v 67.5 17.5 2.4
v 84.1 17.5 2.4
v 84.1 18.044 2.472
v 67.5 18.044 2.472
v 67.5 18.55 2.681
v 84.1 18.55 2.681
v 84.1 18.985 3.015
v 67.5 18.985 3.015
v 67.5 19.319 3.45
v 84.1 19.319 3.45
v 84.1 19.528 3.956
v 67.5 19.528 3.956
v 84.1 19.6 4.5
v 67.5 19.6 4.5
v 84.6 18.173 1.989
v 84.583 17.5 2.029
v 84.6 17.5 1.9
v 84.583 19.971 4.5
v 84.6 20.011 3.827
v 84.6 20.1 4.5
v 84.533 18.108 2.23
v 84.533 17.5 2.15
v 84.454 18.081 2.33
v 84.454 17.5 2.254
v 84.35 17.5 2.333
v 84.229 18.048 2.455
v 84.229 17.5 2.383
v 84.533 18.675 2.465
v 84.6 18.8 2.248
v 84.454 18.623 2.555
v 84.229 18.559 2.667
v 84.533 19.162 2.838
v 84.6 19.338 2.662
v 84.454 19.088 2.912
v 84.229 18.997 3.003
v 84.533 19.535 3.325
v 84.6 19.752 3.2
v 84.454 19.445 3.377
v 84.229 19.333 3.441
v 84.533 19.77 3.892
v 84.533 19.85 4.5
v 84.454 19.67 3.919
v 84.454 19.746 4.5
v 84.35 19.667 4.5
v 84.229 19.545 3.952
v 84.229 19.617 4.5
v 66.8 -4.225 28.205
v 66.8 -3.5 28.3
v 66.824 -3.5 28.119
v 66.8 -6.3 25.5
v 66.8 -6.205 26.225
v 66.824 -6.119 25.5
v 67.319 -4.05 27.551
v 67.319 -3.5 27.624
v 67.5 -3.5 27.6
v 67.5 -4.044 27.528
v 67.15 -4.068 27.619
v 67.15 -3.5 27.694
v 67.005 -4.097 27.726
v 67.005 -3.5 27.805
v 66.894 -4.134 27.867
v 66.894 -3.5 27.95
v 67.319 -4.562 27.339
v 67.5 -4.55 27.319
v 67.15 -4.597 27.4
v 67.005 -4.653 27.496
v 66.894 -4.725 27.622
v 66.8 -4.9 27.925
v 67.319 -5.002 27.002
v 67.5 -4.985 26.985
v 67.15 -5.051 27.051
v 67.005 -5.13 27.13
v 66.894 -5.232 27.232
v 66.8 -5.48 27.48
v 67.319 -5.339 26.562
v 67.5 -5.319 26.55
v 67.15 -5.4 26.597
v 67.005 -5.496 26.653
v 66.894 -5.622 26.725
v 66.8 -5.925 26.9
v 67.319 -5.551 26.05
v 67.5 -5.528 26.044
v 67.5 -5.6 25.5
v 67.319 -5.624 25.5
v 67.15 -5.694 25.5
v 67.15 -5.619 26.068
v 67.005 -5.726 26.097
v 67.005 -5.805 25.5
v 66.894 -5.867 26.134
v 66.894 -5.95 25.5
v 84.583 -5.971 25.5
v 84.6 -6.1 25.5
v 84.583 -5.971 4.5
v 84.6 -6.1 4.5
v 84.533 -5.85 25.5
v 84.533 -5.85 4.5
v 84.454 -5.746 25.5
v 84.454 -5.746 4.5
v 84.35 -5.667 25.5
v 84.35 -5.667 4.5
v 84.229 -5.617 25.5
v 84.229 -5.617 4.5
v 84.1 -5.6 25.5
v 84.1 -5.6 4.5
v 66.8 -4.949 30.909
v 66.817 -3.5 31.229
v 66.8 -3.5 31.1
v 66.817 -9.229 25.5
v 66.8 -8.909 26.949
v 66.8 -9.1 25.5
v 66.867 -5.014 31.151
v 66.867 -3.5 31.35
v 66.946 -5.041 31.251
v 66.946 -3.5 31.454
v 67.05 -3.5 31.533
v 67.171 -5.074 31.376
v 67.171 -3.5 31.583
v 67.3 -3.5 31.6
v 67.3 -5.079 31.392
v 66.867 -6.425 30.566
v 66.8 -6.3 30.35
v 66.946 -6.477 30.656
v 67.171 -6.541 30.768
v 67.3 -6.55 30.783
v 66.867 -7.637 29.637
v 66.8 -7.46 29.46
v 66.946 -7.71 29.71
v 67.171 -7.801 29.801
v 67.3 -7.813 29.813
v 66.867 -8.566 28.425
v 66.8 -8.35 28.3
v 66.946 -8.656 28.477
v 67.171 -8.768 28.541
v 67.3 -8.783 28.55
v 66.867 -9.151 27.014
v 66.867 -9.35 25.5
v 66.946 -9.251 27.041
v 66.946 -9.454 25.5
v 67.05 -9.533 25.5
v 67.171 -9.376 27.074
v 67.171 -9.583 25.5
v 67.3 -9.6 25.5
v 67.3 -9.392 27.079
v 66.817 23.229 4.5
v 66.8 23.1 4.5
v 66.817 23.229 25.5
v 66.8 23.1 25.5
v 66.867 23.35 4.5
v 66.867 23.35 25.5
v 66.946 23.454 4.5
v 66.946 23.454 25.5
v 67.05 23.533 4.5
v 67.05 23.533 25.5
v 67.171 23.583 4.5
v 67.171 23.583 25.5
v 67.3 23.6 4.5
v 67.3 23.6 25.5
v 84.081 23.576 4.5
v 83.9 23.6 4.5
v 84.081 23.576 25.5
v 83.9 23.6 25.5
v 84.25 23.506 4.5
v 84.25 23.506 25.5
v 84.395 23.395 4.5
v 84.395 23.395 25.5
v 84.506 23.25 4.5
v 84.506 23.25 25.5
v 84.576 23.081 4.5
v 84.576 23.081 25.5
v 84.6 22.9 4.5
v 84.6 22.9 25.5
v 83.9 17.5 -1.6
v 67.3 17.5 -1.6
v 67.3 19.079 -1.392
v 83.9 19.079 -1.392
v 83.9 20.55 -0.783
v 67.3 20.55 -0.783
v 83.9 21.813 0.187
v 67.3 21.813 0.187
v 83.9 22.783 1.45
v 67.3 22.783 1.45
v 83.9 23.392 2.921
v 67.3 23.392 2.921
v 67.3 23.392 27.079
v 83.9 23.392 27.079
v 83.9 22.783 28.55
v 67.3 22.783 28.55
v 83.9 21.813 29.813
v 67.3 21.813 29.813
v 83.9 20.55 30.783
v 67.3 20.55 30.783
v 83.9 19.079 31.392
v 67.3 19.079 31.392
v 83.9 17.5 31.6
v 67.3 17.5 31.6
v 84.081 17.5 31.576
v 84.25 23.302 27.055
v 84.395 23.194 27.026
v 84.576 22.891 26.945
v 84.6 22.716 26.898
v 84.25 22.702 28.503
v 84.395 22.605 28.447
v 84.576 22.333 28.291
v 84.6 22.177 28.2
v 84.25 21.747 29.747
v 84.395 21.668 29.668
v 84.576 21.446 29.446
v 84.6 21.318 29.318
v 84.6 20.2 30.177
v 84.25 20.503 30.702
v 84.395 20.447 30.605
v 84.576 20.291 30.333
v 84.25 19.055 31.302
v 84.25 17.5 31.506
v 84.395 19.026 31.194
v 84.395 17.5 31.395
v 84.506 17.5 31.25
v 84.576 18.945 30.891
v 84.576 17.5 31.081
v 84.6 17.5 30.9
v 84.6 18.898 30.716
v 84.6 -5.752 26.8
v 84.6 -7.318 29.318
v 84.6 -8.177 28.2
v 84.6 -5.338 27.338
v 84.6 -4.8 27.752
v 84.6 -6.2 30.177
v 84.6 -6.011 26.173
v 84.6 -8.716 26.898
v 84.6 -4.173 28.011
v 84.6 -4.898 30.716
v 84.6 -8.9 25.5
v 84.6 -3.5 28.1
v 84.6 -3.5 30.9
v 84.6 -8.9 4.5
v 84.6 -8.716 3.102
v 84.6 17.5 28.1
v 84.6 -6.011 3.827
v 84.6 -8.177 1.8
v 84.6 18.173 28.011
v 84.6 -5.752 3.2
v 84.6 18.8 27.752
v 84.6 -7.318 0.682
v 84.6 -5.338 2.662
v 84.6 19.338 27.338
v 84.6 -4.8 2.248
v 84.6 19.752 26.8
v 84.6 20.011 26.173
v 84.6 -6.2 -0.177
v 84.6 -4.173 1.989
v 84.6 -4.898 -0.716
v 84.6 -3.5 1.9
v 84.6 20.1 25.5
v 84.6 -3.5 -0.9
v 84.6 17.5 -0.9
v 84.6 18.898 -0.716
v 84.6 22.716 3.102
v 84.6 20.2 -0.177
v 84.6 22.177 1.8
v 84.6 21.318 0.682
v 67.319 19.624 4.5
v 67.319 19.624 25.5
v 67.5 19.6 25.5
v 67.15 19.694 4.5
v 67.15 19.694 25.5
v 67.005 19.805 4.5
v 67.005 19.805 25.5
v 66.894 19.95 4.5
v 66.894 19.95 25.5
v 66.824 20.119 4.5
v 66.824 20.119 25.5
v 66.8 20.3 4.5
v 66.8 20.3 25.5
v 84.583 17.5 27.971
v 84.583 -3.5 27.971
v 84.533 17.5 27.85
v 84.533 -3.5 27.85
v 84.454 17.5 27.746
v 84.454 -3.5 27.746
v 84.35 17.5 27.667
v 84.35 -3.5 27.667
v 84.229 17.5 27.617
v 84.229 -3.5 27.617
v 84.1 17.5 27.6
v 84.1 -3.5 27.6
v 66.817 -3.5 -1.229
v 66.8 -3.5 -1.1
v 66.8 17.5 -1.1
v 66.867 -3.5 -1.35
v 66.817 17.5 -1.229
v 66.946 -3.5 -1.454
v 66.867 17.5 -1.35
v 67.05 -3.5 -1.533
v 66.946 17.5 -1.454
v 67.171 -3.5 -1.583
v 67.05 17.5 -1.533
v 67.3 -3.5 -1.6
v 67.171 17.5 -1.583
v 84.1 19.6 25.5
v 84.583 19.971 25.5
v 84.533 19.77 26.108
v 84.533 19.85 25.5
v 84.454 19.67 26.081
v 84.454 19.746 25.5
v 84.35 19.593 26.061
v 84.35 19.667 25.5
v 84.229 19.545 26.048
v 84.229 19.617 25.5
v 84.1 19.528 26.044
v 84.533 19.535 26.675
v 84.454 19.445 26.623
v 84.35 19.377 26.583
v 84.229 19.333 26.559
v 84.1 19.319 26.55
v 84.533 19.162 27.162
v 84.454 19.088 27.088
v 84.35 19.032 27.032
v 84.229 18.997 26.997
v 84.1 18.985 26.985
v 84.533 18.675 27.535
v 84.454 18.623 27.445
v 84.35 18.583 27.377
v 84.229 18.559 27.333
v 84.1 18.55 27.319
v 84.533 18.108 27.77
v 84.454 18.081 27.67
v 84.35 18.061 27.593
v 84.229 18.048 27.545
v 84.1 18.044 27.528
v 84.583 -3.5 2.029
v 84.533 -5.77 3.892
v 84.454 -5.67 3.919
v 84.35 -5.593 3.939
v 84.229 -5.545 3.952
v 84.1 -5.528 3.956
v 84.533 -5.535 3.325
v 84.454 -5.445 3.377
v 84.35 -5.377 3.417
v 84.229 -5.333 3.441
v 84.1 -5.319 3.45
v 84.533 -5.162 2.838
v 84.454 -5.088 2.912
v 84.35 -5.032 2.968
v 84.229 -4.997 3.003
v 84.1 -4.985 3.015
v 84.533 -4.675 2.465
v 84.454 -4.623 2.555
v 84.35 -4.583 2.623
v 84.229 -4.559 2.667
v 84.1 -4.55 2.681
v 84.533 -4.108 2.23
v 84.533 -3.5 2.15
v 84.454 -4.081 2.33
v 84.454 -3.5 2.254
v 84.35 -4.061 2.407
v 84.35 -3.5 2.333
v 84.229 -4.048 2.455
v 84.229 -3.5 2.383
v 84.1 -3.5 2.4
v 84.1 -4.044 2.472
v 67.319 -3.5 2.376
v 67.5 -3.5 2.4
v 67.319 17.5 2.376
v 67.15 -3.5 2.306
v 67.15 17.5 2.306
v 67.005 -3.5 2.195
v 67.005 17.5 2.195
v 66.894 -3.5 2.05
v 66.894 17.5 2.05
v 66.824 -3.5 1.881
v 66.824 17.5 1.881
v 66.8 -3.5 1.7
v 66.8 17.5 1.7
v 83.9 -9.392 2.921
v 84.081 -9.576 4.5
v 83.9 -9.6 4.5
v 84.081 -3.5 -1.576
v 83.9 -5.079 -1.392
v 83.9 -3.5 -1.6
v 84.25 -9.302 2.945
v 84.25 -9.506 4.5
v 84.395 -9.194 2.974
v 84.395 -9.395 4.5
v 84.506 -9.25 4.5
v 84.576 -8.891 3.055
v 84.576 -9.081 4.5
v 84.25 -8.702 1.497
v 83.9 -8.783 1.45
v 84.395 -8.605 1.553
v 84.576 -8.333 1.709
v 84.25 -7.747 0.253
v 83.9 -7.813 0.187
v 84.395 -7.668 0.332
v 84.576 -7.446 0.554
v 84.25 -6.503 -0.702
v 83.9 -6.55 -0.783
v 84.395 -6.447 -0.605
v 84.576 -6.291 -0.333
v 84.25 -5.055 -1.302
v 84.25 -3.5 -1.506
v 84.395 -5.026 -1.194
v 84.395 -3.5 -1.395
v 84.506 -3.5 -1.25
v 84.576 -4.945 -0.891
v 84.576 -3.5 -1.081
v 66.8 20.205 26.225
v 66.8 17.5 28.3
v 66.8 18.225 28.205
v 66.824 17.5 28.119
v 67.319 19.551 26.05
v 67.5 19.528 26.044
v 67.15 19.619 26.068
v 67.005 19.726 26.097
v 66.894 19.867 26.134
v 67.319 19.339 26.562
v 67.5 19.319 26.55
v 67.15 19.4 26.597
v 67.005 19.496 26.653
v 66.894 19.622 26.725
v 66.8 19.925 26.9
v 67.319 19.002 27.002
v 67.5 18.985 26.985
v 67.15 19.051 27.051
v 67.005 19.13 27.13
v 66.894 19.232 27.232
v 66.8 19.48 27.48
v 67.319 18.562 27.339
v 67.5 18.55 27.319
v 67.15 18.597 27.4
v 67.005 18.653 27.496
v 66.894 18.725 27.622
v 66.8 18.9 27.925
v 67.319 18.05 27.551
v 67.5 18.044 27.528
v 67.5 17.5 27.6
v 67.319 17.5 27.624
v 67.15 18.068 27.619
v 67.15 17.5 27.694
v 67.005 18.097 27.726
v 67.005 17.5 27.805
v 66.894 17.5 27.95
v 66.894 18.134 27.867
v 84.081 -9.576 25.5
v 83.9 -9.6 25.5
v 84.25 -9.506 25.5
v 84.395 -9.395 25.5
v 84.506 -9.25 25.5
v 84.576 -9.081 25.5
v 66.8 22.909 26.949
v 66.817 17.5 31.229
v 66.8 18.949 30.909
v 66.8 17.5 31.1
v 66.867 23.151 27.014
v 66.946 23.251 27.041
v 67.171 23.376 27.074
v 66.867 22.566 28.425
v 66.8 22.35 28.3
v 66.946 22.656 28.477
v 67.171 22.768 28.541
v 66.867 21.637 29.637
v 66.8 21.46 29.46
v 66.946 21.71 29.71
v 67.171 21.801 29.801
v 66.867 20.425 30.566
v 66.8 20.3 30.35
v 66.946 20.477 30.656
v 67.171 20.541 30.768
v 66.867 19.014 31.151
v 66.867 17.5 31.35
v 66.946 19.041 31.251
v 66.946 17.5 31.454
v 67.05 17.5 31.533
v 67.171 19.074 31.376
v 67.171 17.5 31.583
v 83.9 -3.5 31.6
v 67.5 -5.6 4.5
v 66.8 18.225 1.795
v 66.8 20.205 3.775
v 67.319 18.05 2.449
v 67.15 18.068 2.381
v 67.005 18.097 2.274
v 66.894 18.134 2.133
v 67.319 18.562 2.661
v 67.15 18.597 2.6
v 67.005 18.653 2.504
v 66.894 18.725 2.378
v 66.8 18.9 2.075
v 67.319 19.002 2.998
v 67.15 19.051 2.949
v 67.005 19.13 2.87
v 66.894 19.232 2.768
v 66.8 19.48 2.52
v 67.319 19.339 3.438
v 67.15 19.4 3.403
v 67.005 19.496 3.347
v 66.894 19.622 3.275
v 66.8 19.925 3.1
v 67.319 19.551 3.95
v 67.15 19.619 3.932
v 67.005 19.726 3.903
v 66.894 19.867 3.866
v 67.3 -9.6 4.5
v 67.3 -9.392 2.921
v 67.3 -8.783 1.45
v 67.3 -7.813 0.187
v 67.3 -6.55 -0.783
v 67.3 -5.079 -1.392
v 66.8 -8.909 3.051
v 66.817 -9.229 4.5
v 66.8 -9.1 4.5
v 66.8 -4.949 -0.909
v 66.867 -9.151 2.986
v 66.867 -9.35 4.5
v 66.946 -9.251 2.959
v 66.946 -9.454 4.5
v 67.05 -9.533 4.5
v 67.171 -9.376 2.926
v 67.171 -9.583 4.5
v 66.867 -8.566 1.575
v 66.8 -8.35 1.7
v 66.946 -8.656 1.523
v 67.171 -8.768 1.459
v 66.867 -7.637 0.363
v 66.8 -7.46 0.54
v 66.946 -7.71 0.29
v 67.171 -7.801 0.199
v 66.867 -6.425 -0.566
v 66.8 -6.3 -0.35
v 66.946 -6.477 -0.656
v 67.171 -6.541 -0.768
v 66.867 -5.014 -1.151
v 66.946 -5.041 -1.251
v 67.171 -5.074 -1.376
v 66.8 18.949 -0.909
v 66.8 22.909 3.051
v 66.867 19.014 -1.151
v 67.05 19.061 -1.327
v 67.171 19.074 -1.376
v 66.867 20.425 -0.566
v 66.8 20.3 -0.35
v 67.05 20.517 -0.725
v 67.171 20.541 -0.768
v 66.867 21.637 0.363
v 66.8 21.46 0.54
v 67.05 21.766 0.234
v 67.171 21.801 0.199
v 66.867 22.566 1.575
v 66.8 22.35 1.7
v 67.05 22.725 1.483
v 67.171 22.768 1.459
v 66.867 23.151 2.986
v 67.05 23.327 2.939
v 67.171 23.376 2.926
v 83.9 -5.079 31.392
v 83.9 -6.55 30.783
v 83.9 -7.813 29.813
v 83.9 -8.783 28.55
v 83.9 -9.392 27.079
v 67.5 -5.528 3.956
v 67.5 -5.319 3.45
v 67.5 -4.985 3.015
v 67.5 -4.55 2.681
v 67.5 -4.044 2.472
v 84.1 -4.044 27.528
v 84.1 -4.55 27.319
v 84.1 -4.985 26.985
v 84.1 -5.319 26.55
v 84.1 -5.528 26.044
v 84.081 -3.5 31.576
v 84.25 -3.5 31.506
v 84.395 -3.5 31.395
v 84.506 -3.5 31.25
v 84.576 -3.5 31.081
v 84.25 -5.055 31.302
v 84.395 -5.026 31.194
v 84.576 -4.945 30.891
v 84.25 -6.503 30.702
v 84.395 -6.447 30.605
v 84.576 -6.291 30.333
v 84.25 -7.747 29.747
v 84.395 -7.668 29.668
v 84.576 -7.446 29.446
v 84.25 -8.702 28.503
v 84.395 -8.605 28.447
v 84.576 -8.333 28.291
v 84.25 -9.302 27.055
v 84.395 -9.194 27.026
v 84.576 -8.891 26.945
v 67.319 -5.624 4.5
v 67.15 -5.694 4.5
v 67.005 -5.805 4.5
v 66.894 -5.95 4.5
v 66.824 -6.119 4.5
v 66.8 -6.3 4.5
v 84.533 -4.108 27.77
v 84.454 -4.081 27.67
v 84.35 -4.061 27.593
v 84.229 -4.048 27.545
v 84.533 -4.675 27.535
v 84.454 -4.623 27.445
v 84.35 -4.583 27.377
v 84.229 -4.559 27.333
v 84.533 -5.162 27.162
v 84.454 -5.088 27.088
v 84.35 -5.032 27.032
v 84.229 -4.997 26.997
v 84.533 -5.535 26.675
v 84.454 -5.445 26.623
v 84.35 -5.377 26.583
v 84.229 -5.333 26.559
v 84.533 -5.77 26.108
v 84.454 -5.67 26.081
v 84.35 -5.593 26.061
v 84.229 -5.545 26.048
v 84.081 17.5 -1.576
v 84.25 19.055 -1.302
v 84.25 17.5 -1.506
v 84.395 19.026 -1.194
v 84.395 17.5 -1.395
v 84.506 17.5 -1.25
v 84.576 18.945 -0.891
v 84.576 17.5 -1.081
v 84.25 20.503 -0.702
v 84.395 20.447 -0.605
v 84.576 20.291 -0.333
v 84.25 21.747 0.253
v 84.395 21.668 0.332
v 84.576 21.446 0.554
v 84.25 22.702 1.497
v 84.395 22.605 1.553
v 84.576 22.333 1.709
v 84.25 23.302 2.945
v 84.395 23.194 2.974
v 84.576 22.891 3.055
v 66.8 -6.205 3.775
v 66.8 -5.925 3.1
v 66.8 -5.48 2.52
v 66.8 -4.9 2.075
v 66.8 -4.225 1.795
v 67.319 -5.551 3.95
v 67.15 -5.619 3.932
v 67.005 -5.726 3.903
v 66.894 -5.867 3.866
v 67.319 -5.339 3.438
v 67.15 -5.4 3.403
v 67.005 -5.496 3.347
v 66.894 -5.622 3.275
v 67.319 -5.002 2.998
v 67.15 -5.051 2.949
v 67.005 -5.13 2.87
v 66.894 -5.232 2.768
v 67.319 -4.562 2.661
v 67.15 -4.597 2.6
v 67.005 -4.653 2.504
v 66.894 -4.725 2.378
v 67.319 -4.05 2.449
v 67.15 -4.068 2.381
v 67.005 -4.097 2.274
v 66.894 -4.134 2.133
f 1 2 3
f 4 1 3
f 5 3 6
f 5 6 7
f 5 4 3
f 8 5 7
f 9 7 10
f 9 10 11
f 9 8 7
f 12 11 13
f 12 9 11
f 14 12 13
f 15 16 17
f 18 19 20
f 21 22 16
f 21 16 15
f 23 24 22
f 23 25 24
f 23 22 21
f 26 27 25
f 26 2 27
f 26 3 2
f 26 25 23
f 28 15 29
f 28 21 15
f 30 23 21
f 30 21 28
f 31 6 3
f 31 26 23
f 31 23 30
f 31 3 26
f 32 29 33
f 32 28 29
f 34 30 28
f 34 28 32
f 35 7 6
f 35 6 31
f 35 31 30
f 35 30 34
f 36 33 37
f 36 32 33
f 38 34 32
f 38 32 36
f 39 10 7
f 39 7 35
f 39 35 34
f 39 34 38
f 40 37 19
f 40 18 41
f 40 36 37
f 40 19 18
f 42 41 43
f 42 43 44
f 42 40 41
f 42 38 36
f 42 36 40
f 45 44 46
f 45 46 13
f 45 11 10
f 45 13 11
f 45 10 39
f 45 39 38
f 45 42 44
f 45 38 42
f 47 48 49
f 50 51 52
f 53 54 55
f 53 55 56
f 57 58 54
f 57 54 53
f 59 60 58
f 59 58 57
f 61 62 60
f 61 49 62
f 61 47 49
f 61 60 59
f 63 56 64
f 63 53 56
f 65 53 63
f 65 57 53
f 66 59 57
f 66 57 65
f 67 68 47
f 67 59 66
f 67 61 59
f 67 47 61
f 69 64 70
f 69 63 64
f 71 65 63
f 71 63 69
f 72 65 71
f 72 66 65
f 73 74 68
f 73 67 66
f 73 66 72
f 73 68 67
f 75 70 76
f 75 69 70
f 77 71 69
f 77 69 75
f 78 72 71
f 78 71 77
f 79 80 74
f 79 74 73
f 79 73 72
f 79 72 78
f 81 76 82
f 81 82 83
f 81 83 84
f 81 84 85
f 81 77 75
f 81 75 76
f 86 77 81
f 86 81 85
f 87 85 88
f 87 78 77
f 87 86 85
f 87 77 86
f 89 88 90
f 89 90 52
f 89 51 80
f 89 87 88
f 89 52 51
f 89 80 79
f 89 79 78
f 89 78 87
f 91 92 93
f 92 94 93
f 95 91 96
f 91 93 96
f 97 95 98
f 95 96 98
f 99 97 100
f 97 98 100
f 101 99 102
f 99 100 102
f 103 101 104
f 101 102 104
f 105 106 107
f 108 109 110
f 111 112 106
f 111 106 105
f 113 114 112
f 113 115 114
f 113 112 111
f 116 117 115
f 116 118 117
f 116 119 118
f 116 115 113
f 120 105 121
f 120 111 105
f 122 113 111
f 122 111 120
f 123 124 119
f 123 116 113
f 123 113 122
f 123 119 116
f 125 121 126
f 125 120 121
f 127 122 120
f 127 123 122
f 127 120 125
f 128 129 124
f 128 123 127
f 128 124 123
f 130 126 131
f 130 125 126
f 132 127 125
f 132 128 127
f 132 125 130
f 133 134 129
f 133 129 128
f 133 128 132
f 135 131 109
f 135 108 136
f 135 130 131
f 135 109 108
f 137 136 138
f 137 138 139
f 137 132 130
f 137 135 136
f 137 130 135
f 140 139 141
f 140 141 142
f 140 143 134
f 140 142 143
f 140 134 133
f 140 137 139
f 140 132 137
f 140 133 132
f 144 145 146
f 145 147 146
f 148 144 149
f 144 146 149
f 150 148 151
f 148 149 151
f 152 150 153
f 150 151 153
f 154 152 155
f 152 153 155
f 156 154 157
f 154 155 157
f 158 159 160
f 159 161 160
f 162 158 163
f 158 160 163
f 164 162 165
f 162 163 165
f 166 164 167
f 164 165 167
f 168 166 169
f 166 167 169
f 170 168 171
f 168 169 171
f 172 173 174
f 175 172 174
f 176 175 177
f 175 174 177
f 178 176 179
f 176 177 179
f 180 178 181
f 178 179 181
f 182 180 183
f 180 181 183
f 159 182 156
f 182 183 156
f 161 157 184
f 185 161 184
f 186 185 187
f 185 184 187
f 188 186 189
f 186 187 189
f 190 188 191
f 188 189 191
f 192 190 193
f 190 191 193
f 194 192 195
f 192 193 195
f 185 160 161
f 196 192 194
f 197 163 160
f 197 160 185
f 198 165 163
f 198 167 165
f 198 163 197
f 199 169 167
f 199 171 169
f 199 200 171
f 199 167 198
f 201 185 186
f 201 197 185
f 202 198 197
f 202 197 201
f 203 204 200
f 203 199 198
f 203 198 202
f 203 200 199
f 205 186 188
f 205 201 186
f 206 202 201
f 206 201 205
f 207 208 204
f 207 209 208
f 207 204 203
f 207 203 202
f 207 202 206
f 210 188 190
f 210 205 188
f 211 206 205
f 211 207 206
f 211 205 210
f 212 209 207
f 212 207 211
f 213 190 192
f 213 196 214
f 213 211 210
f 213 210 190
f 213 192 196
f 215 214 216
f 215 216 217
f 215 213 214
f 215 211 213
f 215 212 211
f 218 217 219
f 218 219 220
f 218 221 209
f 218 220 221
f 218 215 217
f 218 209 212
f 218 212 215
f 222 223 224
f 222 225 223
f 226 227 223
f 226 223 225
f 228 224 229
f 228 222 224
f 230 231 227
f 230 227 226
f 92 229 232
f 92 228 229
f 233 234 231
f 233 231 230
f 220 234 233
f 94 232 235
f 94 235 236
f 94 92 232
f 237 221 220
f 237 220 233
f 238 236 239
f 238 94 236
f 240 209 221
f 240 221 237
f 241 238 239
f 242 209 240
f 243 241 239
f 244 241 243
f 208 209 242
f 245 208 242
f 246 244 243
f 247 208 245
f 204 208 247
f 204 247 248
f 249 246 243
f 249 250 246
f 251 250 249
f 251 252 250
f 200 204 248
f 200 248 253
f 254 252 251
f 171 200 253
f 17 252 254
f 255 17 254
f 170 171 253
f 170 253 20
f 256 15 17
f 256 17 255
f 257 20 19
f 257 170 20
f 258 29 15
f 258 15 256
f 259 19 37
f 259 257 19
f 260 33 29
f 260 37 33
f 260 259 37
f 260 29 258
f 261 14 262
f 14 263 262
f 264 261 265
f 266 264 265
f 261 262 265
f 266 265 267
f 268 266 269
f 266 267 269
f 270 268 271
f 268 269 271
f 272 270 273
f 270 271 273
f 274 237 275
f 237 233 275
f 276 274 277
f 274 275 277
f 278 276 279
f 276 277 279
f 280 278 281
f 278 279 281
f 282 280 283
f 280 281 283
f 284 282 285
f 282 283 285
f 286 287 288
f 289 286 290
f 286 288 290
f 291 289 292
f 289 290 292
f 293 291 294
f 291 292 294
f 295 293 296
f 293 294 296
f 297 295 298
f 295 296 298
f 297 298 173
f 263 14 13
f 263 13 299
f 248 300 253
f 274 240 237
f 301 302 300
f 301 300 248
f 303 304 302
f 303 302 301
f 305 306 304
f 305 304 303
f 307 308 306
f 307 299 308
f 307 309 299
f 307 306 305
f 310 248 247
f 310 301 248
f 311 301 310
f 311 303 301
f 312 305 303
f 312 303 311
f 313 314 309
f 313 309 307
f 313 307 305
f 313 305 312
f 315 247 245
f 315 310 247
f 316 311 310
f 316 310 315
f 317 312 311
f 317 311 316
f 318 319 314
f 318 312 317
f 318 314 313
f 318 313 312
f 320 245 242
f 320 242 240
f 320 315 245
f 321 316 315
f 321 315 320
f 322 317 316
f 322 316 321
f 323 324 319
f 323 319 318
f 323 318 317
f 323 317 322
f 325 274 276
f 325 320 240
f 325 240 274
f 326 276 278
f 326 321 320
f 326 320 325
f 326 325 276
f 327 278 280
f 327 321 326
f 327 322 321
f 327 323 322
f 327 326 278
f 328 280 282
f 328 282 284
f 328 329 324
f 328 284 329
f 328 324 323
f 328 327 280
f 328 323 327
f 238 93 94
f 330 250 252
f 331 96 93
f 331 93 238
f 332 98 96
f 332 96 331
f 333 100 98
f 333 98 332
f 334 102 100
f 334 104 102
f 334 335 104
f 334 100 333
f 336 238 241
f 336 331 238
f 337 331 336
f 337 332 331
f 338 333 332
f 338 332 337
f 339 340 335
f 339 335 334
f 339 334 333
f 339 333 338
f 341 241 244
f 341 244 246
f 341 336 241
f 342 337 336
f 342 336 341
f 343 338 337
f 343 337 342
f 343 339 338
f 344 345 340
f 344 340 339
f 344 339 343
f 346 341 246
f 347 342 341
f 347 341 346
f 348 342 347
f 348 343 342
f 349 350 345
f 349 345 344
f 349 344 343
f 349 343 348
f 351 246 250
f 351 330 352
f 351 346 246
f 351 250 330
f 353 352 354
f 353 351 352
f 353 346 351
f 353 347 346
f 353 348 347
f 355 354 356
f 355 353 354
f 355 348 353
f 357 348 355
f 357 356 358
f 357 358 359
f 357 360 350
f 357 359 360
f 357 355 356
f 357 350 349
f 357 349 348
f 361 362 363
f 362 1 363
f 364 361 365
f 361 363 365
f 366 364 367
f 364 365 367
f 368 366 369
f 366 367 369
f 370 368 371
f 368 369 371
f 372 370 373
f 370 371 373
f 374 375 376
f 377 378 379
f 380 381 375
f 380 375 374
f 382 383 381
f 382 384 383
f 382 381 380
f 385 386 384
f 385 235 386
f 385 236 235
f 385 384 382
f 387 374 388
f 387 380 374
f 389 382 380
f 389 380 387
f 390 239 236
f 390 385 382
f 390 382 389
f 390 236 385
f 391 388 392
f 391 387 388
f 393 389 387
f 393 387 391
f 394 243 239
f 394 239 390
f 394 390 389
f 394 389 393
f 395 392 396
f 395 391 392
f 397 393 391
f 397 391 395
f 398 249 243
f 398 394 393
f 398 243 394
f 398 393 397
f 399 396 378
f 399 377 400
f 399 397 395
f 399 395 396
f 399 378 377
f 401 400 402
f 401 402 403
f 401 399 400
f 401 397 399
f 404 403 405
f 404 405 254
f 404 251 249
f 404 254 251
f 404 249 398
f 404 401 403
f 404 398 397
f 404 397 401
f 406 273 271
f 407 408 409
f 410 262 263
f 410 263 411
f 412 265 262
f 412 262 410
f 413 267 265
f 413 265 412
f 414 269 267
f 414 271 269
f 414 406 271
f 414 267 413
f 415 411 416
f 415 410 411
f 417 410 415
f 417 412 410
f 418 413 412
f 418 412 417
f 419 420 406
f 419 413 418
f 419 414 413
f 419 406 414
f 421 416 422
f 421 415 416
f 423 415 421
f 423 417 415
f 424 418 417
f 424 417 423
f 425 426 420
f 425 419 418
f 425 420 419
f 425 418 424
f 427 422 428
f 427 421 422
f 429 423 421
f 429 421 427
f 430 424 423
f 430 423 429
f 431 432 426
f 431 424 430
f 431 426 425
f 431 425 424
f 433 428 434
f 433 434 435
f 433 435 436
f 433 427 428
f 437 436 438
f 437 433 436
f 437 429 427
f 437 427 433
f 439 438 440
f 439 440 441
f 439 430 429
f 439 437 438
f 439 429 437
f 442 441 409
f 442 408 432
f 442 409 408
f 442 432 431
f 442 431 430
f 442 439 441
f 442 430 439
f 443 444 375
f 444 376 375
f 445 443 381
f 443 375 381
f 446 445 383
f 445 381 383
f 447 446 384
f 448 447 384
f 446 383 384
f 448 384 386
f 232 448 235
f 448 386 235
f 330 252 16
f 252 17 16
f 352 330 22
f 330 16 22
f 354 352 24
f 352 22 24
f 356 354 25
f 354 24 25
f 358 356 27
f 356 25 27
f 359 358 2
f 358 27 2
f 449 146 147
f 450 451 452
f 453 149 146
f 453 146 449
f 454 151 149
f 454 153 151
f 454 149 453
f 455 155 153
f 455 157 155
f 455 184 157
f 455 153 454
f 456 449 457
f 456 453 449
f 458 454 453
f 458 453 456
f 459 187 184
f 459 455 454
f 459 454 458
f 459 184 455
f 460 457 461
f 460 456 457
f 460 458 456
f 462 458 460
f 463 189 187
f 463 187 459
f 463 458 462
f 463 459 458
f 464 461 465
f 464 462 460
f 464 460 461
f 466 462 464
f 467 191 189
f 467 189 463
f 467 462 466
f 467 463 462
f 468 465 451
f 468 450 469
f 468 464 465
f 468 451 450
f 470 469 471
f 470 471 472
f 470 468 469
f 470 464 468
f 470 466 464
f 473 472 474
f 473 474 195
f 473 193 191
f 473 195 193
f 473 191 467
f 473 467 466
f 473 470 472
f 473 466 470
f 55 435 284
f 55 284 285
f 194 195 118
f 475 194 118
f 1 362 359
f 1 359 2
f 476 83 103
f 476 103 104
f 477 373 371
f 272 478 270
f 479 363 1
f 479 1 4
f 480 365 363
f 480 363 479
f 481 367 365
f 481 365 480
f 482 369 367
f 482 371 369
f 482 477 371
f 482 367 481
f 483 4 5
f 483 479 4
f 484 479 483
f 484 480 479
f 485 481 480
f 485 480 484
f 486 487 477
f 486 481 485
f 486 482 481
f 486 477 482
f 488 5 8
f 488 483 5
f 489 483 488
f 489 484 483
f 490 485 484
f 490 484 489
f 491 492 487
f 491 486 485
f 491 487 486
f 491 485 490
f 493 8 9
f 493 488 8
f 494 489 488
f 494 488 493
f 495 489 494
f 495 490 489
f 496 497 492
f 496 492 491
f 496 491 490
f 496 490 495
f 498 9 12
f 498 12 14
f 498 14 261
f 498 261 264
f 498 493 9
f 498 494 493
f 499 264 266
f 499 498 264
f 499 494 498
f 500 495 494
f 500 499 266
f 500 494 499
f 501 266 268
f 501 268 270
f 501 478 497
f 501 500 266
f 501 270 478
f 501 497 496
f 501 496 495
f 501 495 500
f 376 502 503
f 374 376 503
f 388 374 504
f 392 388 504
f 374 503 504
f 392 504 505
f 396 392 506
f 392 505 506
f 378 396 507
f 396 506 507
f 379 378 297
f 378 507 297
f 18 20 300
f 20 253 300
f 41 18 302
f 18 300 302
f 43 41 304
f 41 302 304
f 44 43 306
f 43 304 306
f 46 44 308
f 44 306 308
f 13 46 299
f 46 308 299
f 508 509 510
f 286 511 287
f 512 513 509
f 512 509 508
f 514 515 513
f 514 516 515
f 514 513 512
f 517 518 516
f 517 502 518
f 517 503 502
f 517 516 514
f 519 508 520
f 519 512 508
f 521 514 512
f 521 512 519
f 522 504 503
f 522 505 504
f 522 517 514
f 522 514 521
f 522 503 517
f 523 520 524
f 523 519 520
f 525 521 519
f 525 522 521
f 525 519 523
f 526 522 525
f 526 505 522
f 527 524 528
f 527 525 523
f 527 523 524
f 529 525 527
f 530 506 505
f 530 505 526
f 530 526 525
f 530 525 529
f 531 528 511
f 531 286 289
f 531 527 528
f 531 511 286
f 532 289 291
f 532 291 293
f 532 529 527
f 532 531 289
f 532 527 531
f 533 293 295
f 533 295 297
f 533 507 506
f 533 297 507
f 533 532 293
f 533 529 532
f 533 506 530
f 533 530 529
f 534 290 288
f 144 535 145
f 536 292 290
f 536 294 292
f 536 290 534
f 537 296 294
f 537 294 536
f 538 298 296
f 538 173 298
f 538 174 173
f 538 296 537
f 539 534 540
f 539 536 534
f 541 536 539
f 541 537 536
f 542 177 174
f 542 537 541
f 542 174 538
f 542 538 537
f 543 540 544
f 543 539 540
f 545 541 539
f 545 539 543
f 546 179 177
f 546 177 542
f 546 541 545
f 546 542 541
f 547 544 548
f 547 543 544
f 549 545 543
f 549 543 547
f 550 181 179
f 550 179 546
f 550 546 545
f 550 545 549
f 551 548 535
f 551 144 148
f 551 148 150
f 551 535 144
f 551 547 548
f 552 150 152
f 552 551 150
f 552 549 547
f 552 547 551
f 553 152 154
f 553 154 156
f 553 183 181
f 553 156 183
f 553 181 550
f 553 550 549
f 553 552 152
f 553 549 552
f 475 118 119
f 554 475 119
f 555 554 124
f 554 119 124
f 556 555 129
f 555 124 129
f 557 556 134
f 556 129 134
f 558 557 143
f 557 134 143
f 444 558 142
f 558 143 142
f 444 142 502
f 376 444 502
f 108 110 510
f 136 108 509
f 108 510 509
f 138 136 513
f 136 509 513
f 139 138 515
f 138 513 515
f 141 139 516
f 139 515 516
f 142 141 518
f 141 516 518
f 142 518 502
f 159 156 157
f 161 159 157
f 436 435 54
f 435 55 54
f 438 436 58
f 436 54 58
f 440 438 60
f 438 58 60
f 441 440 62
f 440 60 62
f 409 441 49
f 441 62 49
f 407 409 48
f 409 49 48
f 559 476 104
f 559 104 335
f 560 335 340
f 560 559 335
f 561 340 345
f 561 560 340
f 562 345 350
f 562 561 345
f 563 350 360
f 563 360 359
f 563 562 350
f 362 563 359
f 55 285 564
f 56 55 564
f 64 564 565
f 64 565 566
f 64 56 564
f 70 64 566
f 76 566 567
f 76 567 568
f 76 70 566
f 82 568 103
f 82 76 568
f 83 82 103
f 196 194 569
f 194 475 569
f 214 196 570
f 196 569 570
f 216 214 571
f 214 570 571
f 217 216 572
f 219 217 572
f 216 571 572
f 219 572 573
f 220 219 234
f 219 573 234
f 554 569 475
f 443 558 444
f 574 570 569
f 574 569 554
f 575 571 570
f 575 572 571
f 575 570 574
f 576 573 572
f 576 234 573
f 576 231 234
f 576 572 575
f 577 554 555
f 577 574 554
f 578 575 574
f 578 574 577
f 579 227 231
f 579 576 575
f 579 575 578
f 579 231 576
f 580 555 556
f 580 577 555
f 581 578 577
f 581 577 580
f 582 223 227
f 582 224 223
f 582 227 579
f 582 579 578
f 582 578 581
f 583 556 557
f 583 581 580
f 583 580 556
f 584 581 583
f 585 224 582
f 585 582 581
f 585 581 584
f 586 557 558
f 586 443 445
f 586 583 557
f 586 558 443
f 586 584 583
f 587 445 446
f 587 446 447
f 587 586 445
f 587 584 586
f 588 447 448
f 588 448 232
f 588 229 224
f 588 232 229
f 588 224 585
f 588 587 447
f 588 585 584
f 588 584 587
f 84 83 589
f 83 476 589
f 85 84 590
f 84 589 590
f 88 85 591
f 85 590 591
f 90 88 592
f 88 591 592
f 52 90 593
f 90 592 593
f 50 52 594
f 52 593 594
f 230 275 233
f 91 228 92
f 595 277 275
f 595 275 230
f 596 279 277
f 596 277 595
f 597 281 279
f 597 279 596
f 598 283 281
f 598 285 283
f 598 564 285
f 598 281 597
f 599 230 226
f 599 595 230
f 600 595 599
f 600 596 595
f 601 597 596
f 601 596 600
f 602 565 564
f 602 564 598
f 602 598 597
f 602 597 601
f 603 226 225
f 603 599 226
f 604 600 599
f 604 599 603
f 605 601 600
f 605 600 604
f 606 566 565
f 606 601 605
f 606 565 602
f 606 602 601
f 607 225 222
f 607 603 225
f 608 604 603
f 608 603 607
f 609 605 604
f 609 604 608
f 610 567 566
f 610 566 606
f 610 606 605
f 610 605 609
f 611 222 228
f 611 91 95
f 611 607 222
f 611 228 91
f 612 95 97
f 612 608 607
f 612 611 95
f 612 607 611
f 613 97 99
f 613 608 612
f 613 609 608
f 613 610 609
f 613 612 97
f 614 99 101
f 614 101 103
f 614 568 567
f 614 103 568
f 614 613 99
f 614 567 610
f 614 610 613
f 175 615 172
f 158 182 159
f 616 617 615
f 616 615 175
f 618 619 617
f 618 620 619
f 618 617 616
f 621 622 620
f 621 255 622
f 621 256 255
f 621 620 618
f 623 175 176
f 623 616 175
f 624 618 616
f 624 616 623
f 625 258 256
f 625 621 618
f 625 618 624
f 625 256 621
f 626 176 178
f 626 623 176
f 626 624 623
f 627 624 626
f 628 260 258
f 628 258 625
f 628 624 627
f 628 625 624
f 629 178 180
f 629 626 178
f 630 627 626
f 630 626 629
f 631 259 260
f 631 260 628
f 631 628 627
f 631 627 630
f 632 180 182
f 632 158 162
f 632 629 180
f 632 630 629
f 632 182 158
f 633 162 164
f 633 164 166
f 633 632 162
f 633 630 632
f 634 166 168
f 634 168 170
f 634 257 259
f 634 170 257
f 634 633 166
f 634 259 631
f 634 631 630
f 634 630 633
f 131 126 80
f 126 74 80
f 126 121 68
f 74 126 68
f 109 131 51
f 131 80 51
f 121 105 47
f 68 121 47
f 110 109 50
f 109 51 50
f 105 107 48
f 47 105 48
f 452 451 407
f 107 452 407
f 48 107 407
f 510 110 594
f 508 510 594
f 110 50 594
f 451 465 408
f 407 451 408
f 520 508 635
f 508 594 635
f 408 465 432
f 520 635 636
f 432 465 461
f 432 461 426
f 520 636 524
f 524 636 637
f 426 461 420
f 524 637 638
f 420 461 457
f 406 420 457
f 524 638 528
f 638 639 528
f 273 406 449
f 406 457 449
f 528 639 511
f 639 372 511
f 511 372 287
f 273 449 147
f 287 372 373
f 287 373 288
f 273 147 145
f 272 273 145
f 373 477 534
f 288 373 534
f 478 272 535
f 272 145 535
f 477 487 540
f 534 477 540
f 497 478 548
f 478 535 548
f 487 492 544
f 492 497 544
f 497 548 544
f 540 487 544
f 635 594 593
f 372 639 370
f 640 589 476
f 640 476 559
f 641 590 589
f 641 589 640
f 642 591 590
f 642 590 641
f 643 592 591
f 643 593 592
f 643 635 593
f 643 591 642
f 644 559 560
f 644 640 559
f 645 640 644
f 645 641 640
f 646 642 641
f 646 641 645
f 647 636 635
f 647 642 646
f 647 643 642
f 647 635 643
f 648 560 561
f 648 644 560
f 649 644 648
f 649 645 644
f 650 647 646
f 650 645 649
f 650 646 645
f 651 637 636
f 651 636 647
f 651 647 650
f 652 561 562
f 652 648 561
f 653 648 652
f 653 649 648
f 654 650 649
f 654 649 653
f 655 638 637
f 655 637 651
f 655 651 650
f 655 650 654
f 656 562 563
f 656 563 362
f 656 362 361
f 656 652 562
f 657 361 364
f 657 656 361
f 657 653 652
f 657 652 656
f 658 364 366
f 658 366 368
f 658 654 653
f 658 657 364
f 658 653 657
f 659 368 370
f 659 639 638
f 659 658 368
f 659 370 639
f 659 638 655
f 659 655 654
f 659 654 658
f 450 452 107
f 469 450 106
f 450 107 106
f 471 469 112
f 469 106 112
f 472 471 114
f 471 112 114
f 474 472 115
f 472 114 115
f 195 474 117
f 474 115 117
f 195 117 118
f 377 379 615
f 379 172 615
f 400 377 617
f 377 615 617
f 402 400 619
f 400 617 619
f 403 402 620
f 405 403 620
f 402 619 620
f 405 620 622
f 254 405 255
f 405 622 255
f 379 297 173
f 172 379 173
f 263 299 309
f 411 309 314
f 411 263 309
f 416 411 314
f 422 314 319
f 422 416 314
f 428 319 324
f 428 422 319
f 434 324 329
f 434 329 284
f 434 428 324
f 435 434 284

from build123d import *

# Parameters (mm, degrees)
BOSS_EXTRUDE1_DEPTH      = 12
BOSS_EXTRUDE1_DEPTH_BACK = 5.8
FILLET2_R                = 0.7
FILLET3_R                = 0.5


with BuildPart() as part:
    # Sketch1 → Boss-Extrude1 (new, two sides: drawn at the far end of the back side and taken through both)
    with BuildSketch(Plane(origin=(72.6, 0, 0), x_dir=(0, 0, -1), z_dir=(1, 0, 0)).offset(-BOSS_EXTRUDE1_DEPTH_BACK)):
        with BuildLine():
            Line((-31.6, 17.5), (-31.6, -3.5))
            ThreePointArc((-31.6, -3.5), (-29.813351365, -7.813351365), (-25.5, -9.6))
            Line((-25.5, -9.6), (-4.5, -9.6))
            ThreePointArc((-4.5, -9.6), (-0.186648635, -7.813351365), (1.6, -3.5))
            Line((1.6, -3.5), (1.6, 17.5))
            ThreePointArc((1.6, 17.5), (-0.186648635, 21.813351365), (-4.5, 23.6))
            Line((-4.5, 23.6), (-25.5, 23.6))
            ThreePointArc((-25.5, 23.6), (-29.813351365, 21.813351365), (-31.6, 17.5))
        make_face()
        with BuildLine():
            Line((-27.6, 17.5), (-27.6, -3.5))
            ThreePointArc((-27.6, -3.5), (-26.98492424, -4.98492424), (-25.5, -5.6))
            Line((-25.5, -5.6), (-4.5, -5.6))
            ThreePointArc((-4.5, -5.6), (-3.01507576, -4.98492424), (-2.4, -3.5))
            Line((-2.4, -3.5), (-2.4, 17.5))
            ThreePointArc((-2.4, 17.5), (-3.01507576, 18.98492424), (-4.5, 19.6))
            Line((-4.5, 19.6), (-25.5, 19.6))
            ThreePointArc((-25.5, 19.6), (-26.98492424, 18.98492424), (-27.6, 17.5))
        make_face(mode=Mode.SUBTRACT)
    extrude(amount=BOSS_EXTRUDE1_DEPTH + BOSS_EXTRUDE1_DEPTH_BACK)

    # Fillet2
    fillet2_edges = [part.edges().sort_by_distance(p)[0] for p in [
        (66.8, 18.98492424, 26.98492424),
        (66.8, 7, 27.6),
        (66.8, -4.98492424, 26.98492424),
        (66.8, -5.6, 15),
        (84.6, 23.6, 15),
        (66.8, -4.98492424, 3.01507576),
        (66.8, 18.98492424, 3.01507576),
        (84.6, 21.813351365, 29.813351365),
        (66.8, 7, 2.4),
        (66.8, 19.6, 15),
        (84.6, 7, 31.6),
        (84.6, -7.813351365, 29.813351365),
        (84.6, -9.6, 15),
        (84.6, -7.813351365, 0.186648635),
        (84.6, 7, -1.6),
        (84.6, 21.813351365, 0.186648635),
    ]]
    fillet(fillet2_edges, radius=FILLET2_R)

    # Fillet3
    fillet3_edges = [part.edges().sort_by_distance(p)[0] for p in [
        (84.6, 19.6, 15),
        (84.6, 18.98492424, 3.01507576),
        (84.6, 7, 2.4),
        (84.6, -4.98492424, 3.01507576),
        (84.6, -5.6, 15),
        (84.6, -4.98492424, 26.98492424),
        (84.6, 7, 27.6),
        (66.8, 23.6, 15),
        (66.8, 7, -1.6),
        (66.8, 21.813351365, 0.186648635),
        (66.8, -7.813351365, 0.186648635),
        (66.8, -9.6, 15),
        (66.8, -7.813351365, 29.813351365),
        (66.8, 7, 31.6),
        (66.8, 21.813351365, 29.813351365),
        (84.6, 18.98492424, 26.98492424),
    ]]
    fillet(fillet3_edges, radius=FILLET3_R)


solid = part.part
